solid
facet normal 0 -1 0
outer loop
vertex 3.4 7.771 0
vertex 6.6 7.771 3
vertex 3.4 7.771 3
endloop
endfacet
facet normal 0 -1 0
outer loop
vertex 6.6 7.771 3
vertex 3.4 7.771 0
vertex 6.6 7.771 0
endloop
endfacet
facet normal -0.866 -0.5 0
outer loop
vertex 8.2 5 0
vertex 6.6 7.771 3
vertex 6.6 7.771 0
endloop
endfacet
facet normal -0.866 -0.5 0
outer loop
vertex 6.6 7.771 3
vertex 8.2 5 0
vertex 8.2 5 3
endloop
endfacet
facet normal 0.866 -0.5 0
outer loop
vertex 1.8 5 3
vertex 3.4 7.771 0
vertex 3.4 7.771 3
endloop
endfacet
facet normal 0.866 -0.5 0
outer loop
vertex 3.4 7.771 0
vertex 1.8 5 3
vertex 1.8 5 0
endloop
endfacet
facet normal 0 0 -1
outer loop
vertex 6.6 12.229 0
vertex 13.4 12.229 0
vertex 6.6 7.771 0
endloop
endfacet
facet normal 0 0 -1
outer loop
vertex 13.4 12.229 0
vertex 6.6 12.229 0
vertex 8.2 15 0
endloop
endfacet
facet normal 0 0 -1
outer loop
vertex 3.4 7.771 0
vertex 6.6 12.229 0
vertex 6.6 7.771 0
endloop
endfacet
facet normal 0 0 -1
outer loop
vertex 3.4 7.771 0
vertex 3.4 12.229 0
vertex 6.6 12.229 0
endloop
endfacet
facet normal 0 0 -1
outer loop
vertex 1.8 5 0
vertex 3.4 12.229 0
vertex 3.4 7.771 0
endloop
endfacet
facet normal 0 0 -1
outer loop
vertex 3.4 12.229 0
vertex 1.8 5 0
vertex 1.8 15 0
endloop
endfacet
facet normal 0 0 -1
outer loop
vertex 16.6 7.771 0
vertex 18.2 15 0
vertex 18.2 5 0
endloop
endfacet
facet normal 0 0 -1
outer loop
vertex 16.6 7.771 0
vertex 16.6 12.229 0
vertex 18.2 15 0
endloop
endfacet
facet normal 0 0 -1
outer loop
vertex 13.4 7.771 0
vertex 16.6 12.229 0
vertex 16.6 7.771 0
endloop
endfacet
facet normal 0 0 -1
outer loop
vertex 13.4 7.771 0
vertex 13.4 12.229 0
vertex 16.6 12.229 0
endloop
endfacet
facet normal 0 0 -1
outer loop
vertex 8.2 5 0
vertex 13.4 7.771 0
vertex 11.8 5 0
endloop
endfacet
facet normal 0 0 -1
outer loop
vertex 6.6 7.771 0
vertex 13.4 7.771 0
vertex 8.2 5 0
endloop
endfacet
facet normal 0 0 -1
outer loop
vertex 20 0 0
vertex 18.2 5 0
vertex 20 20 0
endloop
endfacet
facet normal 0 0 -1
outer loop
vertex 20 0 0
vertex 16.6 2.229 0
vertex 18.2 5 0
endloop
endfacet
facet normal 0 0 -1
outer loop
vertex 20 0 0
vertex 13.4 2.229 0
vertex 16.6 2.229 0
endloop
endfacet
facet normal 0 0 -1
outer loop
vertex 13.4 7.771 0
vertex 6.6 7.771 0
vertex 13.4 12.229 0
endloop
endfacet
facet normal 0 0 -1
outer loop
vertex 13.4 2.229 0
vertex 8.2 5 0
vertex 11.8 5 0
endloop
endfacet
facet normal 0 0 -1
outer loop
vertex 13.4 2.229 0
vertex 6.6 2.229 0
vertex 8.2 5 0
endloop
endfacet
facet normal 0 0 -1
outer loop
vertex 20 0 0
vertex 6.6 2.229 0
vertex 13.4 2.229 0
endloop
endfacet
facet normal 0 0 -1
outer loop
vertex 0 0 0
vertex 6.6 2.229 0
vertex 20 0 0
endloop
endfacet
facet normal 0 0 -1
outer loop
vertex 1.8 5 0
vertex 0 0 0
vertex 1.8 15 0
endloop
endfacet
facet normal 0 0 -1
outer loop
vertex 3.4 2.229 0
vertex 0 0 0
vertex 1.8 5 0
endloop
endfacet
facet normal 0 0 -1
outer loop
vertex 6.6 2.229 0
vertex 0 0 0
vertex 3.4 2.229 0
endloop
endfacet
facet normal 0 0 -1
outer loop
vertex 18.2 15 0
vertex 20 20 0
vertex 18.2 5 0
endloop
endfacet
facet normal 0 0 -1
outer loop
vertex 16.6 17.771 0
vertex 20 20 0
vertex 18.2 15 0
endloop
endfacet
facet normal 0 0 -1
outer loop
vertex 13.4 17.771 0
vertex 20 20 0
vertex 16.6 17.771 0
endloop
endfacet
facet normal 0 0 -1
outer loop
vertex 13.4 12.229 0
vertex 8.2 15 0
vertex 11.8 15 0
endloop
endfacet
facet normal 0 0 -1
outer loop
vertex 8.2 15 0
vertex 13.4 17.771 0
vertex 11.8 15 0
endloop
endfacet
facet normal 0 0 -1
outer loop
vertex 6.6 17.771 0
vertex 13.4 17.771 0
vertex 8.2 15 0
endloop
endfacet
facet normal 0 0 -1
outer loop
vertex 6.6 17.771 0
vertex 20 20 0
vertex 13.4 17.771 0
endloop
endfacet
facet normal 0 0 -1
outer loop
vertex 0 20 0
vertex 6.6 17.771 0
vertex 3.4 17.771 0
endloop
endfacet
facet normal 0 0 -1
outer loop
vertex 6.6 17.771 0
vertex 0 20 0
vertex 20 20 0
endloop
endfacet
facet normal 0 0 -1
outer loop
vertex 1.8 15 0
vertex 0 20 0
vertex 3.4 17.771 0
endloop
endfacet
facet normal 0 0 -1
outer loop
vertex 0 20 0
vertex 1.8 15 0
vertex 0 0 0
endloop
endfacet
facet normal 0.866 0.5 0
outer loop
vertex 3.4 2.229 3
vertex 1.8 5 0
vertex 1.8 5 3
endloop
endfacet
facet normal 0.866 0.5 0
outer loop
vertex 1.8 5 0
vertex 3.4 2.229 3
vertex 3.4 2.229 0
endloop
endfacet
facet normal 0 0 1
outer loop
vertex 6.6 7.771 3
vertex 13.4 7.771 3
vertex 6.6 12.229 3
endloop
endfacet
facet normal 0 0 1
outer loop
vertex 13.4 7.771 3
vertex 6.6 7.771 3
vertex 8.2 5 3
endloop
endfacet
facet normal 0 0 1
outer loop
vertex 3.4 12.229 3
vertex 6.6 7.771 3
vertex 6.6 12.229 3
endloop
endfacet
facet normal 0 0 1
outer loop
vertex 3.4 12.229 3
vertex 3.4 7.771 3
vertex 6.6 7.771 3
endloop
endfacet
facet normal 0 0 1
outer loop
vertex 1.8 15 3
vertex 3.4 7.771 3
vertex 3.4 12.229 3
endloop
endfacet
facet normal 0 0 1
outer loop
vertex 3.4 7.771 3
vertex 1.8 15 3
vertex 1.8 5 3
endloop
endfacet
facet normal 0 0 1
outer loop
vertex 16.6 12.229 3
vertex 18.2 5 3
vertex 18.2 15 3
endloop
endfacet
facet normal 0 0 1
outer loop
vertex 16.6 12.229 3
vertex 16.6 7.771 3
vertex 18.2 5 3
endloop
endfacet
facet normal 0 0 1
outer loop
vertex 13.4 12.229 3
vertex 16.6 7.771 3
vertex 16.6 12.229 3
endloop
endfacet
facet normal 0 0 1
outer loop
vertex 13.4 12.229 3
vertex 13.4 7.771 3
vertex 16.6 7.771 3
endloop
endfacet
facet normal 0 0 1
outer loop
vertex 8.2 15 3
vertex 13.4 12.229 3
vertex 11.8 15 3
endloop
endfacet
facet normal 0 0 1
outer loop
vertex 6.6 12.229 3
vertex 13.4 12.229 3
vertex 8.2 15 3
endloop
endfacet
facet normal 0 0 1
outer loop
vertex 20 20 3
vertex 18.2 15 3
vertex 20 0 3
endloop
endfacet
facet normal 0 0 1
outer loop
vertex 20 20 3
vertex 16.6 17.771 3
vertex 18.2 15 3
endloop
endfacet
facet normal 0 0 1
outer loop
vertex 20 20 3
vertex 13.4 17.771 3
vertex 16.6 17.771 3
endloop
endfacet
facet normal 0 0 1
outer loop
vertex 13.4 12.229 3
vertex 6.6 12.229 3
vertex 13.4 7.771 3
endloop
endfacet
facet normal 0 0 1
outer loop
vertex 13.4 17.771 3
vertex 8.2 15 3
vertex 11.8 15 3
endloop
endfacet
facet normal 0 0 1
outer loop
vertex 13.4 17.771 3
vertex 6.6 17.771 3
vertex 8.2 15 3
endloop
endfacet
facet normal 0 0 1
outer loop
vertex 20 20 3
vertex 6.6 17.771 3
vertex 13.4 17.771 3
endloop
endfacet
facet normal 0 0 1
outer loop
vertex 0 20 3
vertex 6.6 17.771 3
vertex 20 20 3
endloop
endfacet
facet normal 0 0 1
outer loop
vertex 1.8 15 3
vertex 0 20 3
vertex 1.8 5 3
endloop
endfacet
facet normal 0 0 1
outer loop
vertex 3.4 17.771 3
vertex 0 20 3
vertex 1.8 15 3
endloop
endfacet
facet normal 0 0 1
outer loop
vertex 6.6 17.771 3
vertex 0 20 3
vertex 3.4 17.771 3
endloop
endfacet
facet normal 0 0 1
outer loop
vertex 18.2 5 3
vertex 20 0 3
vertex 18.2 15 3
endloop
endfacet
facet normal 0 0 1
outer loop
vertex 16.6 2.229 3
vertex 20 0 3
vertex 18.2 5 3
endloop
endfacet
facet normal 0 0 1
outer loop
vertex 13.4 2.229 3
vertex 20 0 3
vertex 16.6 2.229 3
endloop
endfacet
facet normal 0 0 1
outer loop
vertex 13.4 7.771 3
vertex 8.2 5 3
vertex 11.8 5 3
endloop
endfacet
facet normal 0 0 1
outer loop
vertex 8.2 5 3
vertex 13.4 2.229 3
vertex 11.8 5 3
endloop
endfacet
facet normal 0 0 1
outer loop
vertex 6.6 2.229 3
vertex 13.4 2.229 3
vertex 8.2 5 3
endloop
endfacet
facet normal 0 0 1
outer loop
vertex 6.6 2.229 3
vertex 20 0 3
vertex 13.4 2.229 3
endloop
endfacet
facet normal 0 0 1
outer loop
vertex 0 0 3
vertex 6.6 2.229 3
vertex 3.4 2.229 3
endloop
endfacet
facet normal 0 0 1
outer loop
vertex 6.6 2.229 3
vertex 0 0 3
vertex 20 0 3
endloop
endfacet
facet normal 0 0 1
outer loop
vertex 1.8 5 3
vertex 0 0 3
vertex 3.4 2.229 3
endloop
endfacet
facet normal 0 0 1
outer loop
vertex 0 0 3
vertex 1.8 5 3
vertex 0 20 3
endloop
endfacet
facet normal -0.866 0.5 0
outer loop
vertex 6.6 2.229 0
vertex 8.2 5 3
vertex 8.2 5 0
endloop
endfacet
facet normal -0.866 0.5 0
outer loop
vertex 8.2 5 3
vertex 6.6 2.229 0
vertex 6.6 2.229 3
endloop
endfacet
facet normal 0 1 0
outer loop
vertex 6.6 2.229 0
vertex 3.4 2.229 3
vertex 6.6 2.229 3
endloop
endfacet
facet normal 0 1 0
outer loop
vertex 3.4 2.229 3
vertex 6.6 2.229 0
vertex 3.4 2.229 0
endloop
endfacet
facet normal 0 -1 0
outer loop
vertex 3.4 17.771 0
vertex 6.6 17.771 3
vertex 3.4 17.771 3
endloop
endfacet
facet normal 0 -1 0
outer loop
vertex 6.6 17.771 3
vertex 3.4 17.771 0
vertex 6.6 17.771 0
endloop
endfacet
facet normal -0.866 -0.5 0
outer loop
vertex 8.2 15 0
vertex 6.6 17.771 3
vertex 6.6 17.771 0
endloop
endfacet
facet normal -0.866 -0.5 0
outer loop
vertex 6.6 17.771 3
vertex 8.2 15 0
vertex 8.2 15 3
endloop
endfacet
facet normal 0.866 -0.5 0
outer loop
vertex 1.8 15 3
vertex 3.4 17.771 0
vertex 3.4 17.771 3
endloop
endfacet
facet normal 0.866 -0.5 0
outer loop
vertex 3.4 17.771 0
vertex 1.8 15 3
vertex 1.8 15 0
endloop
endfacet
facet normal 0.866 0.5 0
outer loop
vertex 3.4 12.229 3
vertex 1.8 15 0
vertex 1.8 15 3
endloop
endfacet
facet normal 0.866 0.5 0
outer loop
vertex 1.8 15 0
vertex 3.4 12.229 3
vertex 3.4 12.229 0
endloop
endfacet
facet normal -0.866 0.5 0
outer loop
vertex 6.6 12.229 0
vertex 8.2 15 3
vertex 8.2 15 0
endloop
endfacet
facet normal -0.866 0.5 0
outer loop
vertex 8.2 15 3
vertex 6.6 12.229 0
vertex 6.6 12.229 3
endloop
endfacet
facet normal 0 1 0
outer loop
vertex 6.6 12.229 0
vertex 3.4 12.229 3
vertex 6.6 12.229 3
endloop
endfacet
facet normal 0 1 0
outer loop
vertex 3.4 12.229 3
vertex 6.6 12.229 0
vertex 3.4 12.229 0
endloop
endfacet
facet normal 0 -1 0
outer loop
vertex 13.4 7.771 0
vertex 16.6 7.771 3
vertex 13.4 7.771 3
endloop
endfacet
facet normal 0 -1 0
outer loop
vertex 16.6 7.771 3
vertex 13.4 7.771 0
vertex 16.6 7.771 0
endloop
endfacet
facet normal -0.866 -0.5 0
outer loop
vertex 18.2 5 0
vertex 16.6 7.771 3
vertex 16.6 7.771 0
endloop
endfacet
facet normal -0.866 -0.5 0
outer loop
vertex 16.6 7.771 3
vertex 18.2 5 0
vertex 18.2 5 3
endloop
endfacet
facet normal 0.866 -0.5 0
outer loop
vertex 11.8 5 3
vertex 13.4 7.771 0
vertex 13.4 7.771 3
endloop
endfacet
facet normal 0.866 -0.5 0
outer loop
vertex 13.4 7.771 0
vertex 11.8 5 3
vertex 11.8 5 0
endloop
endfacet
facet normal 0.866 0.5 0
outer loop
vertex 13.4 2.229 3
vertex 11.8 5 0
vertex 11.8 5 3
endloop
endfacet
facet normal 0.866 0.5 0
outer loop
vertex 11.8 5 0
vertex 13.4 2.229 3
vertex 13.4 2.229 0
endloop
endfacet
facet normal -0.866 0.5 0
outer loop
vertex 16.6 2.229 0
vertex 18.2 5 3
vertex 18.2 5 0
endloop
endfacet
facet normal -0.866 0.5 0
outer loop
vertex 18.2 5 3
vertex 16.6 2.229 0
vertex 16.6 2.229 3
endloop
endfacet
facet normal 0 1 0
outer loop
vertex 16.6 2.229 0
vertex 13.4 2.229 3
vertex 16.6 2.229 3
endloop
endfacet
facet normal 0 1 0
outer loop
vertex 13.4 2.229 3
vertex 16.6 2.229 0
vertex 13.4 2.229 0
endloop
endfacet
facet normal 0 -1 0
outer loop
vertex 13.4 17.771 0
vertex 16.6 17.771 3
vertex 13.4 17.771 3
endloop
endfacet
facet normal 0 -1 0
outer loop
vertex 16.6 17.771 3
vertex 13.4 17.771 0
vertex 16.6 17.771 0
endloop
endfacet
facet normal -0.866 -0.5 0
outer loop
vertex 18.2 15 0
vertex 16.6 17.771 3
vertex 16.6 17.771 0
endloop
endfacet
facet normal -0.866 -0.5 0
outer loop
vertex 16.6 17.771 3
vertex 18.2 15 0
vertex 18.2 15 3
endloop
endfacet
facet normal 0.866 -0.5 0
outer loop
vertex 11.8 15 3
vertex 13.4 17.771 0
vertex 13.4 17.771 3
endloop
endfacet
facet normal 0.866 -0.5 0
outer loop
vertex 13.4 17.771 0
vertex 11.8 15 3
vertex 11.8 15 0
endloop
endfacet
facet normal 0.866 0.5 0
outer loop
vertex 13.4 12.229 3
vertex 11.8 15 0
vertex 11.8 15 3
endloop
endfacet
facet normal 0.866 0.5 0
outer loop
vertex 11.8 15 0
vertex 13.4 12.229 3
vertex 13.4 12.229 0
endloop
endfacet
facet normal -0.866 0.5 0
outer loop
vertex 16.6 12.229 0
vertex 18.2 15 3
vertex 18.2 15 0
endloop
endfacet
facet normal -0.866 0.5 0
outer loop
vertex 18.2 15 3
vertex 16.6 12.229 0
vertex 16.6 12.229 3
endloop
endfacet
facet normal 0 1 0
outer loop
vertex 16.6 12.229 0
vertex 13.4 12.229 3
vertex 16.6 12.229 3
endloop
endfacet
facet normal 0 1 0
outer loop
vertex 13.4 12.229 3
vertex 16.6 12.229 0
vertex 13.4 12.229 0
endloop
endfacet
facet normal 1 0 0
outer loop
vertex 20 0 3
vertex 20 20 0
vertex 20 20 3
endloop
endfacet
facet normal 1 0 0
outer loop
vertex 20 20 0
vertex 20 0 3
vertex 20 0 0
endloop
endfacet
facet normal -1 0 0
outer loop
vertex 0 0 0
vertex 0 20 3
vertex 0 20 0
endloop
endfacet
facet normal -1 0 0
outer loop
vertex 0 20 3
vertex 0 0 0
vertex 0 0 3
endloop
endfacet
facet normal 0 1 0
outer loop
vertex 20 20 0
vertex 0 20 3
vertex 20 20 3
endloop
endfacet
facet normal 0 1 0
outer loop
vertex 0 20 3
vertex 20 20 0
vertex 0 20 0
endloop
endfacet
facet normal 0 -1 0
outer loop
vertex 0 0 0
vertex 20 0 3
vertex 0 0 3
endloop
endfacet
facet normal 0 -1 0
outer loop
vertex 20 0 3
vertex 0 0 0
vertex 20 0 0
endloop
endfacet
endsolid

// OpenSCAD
difference() {
  translate([10.0000000000, 10.0000000000, 1.5000000000]) {
    scale([20.0000000000, 20.0000000000, 3.0000000000]) {
        cube([1, 1, 1], center = true);
    }
  }
  for (i = [0:1]) {
      for (j = [0:1]) {
          translate([10 * i + 5, 10 * j + 5, 0])
          scale([3.2, 3.2, 3])
            cylinder($fn = 6, true);
      }
  }
}
